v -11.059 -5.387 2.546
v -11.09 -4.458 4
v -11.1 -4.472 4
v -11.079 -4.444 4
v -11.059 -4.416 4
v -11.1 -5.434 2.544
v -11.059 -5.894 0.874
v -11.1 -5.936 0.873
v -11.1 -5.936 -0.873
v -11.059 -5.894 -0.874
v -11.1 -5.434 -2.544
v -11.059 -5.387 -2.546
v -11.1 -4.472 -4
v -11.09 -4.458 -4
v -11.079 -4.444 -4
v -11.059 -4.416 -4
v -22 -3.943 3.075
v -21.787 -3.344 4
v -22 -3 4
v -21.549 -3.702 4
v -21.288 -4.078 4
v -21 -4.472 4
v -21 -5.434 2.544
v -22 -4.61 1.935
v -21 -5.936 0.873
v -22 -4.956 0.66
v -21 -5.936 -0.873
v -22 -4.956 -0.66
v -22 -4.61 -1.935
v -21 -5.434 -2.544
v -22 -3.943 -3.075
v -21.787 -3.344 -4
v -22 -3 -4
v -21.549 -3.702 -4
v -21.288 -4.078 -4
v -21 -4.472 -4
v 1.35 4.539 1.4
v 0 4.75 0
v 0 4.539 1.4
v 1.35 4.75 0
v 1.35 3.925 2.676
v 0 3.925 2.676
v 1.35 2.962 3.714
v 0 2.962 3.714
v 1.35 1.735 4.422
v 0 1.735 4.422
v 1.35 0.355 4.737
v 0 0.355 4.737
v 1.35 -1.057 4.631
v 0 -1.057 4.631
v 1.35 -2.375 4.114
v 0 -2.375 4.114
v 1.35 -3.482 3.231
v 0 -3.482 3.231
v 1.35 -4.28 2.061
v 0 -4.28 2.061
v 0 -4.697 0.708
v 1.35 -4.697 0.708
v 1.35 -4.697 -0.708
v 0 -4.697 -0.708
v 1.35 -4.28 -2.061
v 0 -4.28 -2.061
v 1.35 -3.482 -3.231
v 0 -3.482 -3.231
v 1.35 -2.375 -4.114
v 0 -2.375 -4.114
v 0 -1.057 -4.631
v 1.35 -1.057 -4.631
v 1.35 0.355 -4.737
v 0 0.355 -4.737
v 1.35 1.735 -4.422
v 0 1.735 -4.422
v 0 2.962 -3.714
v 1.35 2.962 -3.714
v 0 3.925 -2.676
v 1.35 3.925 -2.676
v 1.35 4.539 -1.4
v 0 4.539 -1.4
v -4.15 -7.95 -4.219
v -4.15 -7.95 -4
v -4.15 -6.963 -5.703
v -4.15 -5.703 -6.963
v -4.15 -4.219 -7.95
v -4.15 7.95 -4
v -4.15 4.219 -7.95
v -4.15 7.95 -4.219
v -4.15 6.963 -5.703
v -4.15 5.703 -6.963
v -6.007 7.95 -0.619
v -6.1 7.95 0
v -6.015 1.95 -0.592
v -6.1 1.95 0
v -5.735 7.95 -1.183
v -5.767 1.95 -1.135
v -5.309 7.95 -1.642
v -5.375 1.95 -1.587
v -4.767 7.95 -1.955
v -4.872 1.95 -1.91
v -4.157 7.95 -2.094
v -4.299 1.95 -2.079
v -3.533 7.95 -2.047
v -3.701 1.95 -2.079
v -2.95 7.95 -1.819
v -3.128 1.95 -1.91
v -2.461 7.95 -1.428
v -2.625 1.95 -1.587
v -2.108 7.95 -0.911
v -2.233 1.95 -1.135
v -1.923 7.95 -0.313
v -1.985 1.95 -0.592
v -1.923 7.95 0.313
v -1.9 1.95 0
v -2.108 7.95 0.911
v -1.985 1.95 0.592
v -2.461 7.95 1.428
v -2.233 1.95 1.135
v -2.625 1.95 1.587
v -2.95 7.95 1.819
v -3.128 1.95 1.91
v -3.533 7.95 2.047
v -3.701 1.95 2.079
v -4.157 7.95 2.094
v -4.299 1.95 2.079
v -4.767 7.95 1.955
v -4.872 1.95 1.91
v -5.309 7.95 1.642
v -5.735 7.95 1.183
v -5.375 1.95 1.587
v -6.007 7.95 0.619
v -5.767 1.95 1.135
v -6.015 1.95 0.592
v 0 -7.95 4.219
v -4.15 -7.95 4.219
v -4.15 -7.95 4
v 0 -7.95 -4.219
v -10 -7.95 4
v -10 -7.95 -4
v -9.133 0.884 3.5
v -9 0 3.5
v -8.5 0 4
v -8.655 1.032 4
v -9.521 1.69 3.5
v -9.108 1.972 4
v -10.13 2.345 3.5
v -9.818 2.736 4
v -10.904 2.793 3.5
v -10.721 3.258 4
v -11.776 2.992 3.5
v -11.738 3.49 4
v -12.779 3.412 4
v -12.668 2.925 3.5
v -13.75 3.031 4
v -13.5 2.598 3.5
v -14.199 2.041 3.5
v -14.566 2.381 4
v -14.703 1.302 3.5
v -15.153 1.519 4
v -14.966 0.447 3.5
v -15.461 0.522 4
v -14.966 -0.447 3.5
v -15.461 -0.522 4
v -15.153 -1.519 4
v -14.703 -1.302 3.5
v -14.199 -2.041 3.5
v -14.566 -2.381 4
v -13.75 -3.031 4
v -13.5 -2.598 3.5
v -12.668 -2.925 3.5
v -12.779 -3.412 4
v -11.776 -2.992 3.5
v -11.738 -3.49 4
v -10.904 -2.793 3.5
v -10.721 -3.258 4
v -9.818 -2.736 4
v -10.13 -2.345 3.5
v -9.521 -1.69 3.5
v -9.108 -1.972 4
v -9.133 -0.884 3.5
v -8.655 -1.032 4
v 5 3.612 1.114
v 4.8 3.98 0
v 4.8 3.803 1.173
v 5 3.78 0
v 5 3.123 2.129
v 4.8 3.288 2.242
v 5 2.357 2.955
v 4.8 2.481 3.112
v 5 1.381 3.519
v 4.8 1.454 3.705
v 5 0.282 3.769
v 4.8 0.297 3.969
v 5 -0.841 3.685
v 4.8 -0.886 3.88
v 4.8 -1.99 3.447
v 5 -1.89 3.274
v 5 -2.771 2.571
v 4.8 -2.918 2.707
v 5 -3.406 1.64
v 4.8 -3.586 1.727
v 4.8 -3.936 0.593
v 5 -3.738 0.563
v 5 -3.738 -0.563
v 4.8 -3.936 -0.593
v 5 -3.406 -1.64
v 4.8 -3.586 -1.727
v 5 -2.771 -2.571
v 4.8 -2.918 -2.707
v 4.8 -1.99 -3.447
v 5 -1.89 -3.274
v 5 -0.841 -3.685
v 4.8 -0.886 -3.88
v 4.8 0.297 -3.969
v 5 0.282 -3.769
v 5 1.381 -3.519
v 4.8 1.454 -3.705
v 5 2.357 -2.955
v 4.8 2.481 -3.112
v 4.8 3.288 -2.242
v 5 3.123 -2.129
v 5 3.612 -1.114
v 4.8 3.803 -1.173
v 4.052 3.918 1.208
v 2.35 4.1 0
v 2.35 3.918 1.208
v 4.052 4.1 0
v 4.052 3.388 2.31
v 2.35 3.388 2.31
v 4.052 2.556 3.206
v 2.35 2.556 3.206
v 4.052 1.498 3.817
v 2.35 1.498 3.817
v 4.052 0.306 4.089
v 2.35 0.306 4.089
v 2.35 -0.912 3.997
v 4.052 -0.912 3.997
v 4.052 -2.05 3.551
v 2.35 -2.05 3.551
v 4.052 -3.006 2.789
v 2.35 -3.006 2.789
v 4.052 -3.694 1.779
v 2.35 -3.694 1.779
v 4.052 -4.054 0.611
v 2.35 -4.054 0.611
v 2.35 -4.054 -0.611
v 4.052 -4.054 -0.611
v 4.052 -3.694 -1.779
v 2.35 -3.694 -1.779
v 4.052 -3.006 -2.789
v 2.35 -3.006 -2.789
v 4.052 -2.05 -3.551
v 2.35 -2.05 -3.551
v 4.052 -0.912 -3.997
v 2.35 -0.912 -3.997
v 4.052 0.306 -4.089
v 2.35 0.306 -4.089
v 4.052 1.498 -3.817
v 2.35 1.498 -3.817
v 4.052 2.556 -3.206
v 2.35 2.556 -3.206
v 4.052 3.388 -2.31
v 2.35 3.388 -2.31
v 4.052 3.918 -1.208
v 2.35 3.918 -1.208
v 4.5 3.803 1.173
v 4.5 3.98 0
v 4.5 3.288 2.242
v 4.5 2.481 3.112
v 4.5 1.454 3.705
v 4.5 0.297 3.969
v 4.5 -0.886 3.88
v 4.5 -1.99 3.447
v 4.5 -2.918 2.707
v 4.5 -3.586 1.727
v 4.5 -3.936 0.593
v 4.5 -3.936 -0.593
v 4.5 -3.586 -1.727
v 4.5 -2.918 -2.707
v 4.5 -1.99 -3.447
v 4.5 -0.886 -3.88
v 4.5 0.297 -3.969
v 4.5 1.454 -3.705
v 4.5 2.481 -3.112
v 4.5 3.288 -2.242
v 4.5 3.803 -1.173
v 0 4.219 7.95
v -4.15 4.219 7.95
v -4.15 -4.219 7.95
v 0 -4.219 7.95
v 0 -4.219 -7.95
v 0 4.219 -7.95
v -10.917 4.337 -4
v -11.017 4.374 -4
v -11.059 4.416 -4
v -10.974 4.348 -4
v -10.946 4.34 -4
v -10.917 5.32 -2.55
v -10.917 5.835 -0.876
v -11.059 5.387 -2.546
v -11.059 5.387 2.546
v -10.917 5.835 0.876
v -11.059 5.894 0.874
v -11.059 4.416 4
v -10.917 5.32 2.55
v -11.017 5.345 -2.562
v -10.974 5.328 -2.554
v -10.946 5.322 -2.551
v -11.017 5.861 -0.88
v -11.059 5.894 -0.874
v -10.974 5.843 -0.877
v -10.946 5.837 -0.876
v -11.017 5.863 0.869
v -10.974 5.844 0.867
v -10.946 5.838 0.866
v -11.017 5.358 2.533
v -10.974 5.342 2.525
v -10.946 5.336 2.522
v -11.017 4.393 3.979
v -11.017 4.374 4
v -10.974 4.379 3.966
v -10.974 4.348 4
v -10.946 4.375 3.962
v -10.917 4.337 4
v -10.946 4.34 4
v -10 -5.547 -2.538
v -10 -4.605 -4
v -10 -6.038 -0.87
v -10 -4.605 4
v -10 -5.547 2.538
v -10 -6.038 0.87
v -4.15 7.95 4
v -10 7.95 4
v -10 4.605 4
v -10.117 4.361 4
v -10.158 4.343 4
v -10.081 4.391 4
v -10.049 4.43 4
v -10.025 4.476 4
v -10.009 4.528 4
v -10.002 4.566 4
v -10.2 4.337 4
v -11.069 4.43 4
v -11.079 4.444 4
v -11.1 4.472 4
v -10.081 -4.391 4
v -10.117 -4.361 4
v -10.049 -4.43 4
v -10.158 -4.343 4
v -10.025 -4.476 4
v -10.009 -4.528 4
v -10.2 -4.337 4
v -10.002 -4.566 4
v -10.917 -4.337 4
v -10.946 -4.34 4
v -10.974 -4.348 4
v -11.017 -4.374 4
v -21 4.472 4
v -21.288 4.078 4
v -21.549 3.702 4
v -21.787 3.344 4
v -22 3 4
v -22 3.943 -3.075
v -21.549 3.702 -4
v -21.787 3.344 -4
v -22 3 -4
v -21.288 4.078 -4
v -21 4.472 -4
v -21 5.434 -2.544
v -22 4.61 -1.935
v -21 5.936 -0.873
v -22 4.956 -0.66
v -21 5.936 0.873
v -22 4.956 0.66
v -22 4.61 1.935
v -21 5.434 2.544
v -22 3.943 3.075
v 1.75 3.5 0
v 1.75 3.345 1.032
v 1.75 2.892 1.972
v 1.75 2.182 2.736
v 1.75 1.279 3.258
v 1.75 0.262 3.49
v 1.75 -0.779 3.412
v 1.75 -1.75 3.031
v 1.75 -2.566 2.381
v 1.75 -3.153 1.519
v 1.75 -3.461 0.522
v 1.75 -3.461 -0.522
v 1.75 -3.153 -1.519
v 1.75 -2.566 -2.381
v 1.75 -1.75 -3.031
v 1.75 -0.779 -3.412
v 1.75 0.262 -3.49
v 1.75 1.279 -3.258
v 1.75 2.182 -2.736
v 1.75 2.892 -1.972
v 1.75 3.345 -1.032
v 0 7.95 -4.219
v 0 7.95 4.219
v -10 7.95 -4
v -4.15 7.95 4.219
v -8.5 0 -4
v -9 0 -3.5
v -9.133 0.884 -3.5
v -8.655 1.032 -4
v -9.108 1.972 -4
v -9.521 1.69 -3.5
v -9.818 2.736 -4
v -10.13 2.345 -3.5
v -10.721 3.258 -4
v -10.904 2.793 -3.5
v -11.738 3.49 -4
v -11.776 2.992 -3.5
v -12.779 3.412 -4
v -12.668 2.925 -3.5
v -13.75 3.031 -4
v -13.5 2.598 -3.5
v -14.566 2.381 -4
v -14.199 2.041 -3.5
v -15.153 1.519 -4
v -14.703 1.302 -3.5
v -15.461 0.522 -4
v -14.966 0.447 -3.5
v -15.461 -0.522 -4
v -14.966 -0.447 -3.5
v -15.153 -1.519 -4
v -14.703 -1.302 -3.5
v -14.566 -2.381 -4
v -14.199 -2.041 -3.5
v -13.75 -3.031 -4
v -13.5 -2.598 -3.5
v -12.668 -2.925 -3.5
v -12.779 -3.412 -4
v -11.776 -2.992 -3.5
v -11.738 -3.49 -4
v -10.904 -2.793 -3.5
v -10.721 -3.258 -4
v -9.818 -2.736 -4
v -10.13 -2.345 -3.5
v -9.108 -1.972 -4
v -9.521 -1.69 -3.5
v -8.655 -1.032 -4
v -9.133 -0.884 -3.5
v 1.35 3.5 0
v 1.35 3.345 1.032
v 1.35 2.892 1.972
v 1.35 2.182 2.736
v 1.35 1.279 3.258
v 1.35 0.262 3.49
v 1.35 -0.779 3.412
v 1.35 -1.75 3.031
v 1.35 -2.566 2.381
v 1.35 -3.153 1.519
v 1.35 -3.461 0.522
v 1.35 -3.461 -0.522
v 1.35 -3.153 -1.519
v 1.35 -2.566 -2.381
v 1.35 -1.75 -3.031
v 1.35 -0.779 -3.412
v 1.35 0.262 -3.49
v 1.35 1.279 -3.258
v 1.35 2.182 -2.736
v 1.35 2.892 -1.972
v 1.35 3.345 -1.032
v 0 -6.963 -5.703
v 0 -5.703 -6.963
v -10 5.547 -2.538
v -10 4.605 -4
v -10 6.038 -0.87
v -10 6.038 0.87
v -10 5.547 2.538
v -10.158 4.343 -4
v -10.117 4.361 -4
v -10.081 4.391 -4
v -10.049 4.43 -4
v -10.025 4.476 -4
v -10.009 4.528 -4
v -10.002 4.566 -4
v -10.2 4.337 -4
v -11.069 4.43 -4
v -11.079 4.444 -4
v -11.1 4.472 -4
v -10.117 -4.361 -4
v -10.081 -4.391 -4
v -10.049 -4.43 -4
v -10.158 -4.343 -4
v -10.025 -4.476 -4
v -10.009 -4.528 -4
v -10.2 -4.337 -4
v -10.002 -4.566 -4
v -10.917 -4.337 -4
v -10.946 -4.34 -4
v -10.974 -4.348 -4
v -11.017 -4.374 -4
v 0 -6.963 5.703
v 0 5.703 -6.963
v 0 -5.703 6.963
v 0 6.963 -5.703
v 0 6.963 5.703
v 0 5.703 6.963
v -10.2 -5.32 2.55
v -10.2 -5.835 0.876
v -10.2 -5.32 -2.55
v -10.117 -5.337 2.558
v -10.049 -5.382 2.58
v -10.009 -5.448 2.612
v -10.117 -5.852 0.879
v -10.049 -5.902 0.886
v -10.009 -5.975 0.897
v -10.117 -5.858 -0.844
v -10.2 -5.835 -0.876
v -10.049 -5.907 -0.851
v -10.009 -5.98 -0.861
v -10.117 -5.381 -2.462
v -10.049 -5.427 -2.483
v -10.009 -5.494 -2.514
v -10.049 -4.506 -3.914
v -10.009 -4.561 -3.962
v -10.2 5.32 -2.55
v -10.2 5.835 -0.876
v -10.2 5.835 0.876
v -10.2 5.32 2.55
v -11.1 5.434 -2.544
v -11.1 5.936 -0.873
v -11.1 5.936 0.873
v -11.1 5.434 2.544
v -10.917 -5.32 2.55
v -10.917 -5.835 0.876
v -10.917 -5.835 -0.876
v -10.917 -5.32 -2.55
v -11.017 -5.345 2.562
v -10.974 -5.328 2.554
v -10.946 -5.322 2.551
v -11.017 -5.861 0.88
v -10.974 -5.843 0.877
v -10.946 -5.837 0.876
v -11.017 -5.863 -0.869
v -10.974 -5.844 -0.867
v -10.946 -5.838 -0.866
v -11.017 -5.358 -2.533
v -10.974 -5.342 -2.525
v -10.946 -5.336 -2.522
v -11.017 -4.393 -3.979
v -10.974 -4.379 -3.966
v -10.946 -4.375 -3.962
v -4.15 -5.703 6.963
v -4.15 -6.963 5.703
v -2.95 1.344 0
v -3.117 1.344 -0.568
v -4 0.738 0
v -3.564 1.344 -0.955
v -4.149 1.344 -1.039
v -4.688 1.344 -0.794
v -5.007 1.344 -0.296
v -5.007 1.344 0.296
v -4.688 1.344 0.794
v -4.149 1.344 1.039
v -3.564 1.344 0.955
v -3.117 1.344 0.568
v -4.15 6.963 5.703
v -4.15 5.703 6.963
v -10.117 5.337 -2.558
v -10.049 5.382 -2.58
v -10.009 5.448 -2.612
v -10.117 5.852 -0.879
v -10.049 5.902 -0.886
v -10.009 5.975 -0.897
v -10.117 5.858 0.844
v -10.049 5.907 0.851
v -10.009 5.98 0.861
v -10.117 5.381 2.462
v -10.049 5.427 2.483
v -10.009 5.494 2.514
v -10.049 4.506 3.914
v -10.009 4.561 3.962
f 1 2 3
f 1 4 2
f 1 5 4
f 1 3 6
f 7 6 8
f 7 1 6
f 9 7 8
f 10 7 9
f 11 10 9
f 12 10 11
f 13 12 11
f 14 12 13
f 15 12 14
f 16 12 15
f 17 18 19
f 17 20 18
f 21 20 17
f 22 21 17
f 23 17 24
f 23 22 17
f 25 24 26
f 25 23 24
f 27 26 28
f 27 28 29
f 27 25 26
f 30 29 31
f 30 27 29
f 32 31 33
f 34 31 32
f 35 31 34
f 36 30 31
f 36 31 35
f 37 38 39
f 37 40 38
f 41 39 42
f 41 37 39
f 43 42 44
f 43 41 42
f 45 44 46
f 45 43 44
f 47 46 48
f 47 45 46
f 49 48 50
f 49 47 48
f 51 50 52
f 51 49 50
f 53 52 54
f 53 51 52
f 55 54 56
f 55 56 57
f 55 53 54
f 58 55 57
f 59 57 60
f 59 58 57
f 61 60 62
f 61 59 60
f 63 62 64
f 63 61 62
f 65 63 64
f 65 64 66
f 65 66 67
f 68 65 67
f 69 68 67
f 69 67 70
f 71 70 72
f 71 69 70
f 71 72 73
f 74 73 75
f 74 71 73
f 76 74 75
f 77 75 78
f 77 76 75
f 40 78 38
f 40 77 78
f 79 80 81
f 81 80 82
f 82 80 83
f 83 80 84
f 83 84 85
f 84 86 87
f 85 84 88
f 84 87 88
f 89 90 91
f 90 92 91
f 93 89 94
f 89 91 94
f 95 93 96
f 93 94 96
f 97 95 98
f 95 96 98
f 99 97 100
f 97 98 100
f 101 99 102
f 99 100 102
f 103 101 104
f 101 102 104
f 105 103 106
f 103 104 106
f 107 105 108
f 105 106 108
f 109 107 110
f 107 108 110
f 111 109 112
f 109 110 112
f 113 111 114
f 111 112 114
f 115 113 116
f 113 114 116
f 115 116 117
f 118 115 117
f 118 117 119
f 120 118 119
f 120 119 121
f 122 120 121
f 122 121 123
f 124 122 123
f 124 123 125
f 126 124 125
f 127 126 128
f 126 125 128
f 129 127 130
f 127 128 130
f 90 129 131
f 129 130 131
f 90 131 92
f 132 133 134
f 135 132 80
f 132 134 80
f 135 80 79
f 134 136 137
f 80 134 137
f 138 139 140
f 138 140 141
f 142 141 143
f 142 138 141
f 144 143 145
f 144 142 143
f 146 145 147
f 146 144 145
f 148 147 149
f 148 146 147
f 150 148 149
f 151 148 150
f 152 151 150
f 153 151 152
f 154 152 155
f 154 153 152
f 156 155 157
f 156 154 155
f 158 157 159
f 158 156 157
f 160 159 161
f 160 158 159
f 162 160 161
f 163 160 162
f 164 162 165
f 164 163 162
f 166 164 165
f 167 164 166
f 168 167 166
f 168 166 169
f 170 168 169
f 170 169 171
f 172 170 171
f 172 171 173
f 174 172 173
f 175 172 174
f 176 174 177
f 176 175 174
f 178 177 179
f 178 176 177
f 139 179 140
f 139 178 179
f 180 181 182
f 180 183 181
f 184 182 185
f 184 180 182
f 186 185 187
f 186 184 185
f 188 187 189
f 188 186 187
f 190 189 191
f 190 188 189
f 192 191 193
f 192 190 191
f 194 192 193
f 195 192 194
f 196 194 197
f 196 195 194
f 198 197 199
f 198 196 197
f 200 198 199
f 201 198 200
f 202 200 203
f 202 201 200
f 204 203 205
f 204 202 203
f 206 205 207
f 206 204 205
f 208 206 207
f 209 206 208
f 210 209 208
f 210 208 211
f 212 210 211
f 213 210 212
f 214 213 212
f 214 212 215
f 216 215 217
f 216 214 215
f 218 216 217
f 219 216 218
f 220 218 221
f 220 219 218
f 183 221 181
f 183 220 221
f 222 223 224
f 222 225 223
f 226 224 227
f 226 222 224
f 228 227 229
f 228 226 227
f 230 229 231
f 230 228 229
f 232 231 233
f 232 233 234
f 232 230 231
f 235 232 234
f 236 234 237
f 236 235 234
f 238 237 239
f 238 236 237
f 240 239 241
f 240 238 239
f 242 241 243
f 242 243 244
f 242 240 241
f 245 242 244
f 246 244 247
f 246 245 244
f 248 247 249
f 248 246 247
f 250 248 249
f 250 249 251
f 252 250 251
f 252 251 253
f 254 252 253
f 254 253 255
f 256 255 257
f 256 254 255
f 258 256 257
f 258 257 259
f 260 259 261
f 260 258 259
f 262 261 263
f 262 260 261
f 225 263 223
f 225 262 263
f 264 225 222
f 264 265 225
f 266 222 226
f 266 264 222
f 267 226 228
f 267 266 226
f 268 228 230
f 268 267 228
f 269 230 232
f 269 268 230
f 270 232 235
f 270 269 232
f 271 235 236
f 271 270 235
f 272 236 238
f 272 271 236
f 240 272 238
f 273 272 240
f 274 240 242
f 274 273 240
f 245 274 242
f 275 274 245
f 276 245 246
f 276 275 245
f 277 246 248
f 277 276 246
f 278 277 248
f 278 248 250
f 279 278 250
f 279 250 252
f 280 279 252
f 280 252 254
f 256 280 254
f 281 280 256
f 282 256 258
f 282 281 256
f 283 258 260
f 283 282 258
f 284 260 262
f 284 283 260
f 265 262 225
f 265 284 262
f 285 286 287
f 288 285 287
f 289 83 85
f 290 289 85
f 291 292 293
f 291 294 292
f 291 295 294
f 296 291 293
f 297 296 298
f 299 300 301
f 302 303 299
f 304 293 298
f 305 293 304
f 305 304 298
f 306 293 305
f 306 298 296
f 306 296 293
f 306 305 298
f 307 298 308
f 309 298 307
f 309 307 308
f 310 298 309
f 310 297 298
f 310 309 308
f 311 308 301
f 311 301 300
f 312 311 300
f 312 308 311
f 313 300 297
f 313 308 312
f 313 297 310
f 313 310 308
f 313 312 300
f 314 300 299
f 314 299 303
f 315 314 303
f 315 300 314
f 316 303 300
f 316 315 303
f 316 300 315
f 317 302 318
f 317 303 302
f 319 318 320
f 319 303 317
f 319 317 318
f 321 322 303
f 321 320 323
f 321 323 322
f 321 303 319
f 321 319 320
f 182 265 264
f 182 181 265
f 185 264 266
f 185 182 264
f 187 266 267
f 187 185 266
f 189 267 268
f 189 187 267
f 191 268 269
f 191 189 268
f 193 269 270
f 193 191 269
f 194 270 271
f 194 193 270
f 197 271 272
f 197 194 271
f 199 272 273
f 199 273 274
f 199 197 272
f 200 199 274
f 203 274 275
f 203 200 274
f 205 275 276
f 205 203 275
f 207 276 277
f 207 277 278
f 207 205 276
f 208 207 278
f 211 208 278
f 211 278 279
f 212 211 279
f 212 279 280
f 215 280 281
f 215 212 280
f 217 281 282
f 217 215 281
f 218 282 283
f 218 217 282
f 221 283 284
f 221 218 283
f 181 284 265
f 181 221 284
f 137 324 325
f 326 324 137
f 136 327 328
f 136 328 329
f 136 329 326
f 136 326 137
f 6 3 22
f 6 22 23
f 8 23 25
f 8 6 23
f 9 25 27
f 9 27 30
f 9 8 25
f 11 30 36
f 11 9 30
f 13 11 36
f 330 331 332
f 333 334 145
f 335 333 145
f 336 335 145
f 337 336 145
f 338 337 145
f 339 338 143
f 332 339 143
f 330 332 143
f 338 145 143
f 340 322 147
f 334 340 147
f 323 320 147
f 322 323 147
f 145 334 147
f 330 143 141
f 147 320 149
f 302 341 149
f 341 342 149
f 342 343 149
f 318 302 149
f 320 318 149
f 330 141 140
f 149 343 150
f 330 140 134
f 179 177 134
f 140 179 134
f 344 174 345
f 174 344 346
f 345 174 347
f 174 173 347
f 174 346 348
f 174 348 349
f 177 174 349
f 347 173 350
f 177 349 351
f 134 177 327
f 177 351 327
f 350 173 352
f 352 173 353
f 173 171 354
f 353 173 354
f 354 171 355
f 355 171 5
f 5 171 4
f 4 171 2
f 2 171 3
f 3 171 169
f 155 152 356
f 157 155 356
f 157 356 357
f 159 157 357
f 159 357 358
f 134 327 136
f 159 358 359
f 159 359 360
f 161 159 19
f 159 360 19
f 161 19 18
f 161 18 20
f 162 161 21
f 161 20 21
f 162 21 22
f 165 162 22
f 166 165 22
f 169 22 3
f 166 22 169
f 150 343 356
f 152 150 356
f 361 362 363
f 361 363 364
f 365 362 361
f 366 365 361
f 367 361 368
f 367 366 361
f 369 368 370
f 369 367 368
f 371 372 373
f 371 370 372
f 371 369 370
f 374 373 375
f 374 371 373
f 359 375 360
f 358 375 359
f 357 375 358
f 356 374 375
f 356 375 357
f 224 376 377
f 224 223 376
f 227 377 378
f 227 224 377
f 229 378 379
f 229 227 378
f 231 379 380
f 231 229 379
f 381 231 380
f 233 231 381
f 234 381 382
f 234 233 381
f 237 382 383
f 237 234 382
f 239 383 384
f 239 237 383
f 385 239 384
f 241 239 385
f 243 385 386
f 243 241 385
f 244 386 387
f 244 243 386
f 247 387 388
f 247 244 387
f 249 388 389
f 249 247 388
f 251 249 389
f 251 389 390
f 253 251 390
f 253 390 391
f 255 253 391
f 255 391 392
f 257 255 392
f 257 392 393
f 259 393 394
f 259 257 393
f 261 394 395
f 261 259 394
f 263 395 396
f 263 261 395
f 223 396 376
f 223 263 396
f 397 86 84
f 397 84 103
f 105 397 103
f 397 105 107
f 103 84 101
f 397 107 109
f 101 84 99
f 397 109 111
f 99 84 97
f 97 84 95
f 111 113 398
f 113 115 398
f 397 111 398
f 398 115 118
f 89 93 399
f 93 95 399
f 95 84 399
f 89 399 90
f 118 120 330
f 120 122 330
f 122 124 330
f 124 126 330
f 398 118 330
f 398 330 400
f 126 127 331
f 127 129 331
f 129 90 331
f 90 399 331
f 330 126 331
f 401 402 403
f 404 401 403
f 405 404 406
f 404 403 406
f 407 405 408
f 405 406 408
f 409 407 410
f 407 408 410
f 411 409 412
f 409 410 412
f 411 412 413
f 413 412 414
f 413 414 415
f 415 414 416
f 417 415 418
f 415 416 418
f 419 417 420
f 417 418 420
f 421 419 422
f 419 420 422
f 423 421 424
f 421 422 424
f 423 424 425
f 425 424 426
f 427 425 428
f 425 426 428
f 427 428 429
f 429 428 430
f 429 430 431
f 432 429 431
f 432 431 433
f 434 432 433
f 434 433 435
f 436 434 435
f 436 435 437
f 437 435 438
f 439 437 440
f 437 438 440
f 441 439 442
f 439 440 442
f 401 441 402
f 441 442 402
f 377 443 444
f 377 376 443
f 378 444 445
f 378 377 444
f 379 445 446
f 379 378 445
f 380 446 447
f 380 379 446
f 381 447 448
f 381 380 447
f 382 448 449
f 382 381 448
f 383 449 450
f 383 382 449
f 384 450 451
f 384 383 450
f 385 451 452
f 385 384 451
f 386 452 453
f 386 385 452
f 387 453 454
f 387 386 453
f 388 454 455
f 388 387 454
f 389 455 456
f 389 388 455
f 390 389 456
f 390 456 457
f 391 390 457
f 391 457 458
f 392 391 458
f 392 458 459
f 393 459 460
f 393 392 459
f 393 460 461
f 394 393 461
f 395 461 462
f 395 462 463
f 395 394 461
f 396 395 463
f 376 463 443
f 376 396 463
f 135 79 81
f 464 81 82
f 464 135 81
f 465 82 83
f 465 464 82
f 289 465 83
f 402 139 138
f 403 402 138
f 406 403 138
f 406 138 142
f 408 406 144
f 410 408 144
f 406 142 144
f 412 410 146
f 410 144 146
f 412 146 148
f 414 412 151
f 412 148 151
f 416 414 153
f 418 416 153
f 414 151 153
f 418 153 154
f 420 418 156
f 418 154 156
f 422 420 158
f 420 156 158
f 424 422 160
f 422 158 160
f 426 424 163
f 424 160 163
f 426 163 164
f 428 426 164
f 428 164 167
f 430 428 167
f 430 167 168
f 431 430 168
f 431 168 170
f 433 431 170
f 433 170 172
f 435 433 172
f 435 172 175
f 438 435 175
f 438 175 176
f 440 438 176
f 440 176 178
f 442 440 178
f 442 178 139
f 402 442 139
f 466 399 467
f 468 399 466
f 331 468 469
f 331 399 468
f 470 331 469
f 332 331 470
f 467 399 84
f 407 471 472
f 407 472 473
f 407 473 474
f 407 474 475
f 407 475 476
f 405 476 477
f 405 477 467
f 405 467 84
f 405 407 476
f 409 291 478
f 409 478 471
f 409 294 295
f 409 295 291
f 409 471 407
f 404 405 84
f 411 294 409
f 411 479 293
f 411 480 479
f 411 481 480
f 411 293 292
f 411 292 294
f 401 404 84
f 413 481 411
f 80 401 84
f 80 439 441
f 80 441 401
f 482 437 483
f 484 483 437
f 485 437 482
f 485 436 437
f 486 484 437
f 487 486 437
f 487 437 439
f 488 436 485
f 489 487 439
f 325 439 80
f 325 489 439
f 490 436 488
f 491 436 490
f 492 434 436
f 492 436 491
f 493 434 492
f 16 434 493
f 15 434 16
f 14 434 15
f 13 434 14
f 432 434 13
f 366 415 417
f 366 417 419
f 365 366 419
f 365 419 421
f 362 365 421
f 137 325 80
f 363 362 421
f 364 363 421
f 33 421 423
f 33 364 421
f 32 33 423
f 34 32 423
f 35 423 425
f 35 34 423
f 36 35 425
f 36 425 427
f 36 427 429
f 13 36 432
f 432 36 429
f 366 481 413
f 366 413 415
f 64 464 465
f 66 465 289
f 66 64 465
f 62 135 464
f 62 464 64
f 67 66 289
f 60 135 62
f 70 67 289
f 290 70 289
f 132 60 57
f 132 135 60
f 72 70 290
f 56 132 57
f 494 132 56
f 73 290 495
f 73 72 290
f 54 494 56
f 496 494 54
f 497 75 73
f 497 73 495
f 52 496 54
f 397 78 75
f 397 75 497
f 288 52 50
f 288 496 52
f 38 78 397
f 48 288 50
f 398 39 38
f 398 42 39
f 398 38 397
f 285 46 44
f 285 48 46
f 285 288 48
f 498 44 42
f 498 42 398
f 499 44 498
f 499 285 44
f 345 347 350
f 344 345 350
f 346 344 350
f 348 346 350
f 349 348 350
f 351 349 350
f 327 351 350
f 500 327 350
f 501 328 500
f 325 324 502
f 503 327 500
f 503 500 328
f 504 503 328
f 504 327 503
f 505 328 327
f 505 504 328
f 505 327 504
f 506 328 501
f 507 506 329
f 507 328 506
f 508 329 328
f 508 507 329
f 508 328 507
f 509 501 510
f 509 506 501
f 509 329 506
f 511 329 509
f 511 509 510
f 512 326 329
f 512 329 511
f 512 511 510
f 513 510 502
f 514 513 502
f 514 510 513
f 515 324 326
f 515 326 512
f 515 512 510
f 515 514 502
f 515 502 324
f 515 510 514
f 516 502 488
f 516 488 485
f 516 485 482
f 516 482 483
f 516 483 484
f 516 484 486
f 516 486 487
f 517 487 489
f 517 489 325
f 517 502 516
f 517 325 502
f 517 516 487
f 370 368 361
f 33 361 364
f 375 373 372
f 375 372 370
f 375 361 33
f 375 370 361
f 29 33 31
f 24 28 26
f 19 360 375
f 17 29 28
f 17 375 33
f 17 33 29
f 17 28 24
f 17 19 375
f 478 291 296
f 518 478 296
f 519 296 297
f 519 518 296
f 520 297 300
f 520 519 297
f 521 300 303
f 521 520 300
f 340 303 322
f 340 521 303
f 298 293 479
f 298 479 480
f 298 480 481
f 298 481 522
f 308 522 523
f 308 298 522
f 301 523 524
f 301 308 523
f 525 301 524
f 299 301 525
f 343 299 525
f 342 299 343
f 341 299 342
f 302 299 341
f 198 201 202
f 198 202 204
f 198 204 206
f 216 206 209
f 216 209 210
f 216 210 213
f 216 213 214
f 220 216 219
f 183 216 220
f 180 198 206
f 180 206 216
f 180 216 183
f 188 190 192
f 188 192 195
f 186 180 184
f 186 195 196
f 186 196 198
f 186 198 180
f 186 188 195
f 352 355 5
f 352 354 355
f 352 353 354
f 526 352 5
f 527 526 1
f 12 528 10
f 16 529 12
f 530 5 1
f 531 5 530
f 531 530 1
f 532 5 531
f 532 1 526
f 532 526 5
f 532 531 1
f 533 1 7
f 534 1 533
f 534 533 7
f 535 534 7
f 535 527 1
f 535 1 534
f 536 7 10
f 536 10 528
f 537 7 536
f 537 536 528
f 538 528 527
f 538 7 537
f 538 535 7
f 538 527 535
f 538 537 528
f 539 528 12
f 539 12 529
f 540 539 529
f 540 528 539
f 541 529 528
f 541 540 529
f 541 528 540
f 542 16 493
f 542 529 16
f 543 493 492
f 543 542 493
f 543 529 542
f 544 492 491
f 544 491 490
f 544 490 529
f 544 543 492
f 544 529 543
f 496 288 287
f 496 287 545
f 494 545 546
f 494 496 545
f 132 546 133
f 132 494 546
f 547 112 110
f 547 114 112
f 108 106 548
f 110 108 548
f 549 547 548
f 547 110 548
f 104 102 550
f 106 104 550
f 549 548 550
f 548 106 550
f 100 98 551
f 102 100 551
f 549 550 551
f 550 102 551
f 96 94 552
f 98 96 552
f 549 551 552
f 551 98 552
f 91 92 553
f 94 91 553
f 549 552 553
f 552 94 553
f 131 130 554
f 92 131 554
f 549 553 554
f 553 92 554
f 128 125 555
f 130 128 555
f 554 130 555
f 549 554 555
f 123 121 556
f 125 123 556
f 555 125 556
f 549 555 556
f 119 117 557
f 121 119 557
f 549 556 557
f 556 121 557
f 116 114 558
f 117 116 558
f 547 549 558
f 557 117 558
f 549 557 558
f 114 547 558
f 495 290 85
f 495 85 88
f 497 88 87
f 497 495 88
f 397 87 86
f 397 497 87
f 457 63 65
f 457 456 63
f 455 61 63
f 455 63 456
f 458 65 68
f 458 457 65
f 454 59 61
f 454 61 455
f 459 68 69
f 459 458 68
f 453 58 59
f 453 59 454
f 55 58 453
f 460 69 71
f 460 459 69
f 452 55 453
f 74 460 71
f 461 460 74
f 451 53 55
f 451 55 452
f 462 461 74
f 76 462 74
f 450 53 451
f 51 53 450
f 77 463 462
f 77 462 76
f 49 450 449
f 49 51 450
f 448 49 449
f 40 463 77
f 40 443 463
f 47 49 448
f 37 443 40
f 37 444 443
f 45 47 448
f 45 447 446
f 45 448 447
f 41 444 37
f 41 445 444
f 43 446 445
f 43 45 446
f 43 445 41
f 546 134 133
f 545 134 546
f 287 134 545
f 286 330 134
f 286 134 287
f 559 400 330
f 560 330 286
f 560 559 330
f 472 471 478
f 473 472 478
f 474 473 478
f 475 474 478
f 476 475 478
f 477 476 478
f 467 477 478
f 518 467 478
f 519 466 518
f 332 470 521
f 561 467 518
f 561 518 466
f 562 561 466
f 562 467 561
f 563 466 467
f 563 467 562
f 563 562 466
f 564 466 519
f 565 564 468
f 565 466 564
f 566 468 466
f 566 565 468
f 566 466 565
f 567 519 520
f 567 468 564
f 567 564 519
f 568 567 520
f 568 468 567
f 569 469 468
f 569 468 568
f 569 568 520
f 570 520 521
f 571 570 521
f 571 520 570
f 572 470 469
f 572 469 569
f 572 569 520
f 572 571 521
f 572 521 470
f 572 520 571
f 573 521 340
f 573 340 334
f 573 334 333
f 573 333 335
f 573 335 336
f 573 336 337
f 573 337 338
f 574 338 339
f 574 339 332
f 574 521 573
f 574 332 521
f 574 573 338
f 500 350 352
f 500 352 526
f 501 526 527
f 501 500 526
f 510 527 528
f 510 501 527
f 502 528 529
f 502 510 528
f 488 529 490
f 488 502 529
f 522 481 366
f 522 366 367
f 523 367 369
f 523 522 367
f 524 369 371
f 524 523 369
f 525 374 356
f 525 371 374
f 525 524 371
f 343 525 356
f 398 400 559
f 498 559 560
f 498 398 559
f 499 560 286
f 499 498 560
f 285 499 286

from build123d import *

# Parameters (mm, degrees)
O_L_DEPTH             = 17.85
CUT_EXTRUDE4_REACH    = 17
CUT_EXTRUDE2_REACH    = 13.95
SKETCH4_R             = 3
CHAMFER4_SIZE         = 0.5
M5_TAPPED_HOLE1_D     = 4.2
M5_TAPPED_HOLE1_DEPTH = 6
M5_TAPPED_HOLE1_TIP   = 1.212435565


with BuildPart() as part:
    # Sketch1 → Revolve1 (revolve)
    with BuildSketch(Plane.XY):
        with BuildLine():
            Line((-22, 0), (-22, 5))
            Line((-22, 5), (-21, 6))
            Line((-21, 6), (-11.1, 6))
            Line((-11.1, 6), (-11.058578644, 5.958578644))
            ThreePointArc((-11.058578644, 5.958578644), (-10.993693974, 5.915224093), (-10.917157288, 5.9))
            Line((-10.917157288, 5.9), (-10.2, 5.9))
            ThreePointArc((-10.2, 5.9), (-10.058578644, 5.958578644), (-10, 6.1))
            Line((-10, 6.1), (-10, 9))
            Line((-10, 9), (0, 9))
            Line((0, 9), (0, 4.75))
            Line((0, 4.75), (1.35, 4.75))
            Line((1.35, 4.75), (1.35, 3.5))
            Line((1.35, 3.5), (1.75, 3.5))
            Line((1.75, 3.5), (2.35, 4.1))
            Line((2.35, 4.1), (4.052153903, 4.1))
            Line((4.052153903, 4.1), (4.5, 3.98))
            Line((4.5, 3.98), (4.8, 3.98))
            Line((4.8, 3.98), (5, 3.78))
            Line((5, 3.78), (5, 0))
            Line((5, 0), (-22, 0))
        make_face()
    revolve(axis=Axis((0, 0, 0), (1, 0, 0)))

    # Sketch3 → O-L (cut)
    with BuildSketch(Plane.ZY.offset(22)):
        with BuildLine():
            Line((-4, 8.062257748), (-4, -8.062257748))
            ThreePointArc((-4, -8.062257748), (-9, 0), (-4, 8.062257748))
        make_face()
        with BuildLine():
            Line((4, 8.062257748), (4, -8.062257748))
            ThreePointArc((4, -8.062257748), (9, 0), (4, 8.062257748))
        make_face()
    extrude(amount=-O_L_DEPTH, mode=Mode.SUBTRACT)

    # Sketch6 → Cut-Extrude4 (cut, up to next)
    with BuildSketch(Plane.ZY.offset(10), mode=Mode.PRIVATE) as cut_extrude4_sk1:
        with BuildLine():
            Line((-4.218708333, 7.95), (4.218708333, 7.95))
            ThreePointArc((4.218708333, 7.95), (0, 9), (-4.218708333, 7.95))
        make_face()
    cut_extrude4_tool1 = extrude(cut_extrude4_sk1.sketch, amount=-CUT_EXTRUDE4_REACH, mode=Mode.PRIVATE) & part.part
    add(cut_extrude4_tool1.solids().sort_by_distance((-10, 8.372173, 0))[0], mode=Mode.SUBTRACT)
    # Sketch6 → Cut-Extrude4 (cut, up to next)
    with BuildSketch(Plane.ZY.offset(10), mode=Mode.PRIVATE) as cut_extrude4_sk2:
        with BuildLine():
            Line((7.95, 4.218708333), (7.95, -4.218708333))
            ThreePointArc((7.95, -4.218708333), (9, 0), (7.95, 4.218708333))
        make_face()
    cut_extrude4_tool2 = extrude(cut_extrude4_sk2.sketch, amount=-CUT_EXTRUDE4_REACH, mode=Mode.PRIVATE) & part.part
    add(cut_extrude4_tool2.solids().sort_by_distance((-10, 0, 8.372173))[0], mode=Mode.SUBTRACT)
    # Sketch6 → Cut-Extrude4 (cut, up to next)
    with BuildSketch(Plane.ZY.offset(10), mode=Mode.PRIVATE) as cut_extrude4_sk3:
        with BuildLine():
            Line((4.218708333, -7.95), (-4.218708333, -7.95))
            ThreePointArc((-4.218708333, -7.95), (0, -9), (4.218708333, -7.95))
        make_face()
    cut_extrude4_tool3 = extrude(cut_extrude4_sk3.sketch, amount=-CUT_EXTRUDE4_REACH, mode=Mode.PRIVATE) & part.part
    add(cut_extrude4_tool3.solids().sort_by_distance((-10, -8.372173, 0))[0], mode=Mode.SUBTRACT)
    # Sketch6 → Cut-Extrude4 (cut, up to next)
    with BuildSketch(Plane.ZY.offset(10), mode=Mode.PRIVATE) as cut_extrude4_sk4:
        with BuildLine():
            Line((-7.95, -4.218708333), (-7.95, 4.218708333))
            ThreePointArc((-7.95, 4.218708333), (-9, 0), (-7.95, -4.218708333))
        make_face()
    cut_extrude4_tool4 = extrude(cut_extrude4_sk4.sketch, amount=-CUT_EXTRUDE4_REACH, mode=Mode.PRIVATE) & part.part
    add(cut_extrude4_tool4.solids().sort_by_distance((-10, 0, -8.372173))[0], mode=Mode.SUBTRACT)

    # Sketch4 → Cut-Extrude2 (cut, up to next)
    with BuildSketch(Plane.XY.offset(4), mode=Mode.PRIVATE) as cut_extrude2_sk1:
        with Locations((-12, 0)):
            Circle(SKETCH4_R)
    cut_extrude2_tool1 = extrude(cut_extrude2_sk1.sketch, amount=-CUT_EXTRUDE2_REACH, mode=Mode.PRIVATE) & part.part
    add(cut_extrude2_tool1.solids().sort_by_distance((-12, 0, 4))[0], mode=Mode.SUBTRACT)

    # Chamfer4
    chamfer4_edges = [part.edges().sort_by_distance(p)[0] for p in [
        (-15, 0, 4),
        (-15, 0, -4),
    ]]
    chamfer(chamfer4_edges, length=CHAMFER4_SIZE)

    # M5 Tapped Hole1
    with Locations(Plane(origin=(0, 7.95, 0), x_dir=(1, 0, 0), z_dir=(0, 1, 0))):
        with Locations((-4, 0)):
            Hole(M5_TAPPED_HOLE1_D / 2, depth=M5_TAPPED_HOLE1_DEPTH)
            with Locations((0, 0, -(M5_TAPPED_HOLE1_DEPTH + M5_TAPPED_HOLE1_TIP / 2))):  # 120° drill point
                Cone(0, M5_TAPPED_HOLE1_D / 2, M5_TAPPED_HOLE1_TIP, mode=Mode.SUBTRACT)


solid = part.part
